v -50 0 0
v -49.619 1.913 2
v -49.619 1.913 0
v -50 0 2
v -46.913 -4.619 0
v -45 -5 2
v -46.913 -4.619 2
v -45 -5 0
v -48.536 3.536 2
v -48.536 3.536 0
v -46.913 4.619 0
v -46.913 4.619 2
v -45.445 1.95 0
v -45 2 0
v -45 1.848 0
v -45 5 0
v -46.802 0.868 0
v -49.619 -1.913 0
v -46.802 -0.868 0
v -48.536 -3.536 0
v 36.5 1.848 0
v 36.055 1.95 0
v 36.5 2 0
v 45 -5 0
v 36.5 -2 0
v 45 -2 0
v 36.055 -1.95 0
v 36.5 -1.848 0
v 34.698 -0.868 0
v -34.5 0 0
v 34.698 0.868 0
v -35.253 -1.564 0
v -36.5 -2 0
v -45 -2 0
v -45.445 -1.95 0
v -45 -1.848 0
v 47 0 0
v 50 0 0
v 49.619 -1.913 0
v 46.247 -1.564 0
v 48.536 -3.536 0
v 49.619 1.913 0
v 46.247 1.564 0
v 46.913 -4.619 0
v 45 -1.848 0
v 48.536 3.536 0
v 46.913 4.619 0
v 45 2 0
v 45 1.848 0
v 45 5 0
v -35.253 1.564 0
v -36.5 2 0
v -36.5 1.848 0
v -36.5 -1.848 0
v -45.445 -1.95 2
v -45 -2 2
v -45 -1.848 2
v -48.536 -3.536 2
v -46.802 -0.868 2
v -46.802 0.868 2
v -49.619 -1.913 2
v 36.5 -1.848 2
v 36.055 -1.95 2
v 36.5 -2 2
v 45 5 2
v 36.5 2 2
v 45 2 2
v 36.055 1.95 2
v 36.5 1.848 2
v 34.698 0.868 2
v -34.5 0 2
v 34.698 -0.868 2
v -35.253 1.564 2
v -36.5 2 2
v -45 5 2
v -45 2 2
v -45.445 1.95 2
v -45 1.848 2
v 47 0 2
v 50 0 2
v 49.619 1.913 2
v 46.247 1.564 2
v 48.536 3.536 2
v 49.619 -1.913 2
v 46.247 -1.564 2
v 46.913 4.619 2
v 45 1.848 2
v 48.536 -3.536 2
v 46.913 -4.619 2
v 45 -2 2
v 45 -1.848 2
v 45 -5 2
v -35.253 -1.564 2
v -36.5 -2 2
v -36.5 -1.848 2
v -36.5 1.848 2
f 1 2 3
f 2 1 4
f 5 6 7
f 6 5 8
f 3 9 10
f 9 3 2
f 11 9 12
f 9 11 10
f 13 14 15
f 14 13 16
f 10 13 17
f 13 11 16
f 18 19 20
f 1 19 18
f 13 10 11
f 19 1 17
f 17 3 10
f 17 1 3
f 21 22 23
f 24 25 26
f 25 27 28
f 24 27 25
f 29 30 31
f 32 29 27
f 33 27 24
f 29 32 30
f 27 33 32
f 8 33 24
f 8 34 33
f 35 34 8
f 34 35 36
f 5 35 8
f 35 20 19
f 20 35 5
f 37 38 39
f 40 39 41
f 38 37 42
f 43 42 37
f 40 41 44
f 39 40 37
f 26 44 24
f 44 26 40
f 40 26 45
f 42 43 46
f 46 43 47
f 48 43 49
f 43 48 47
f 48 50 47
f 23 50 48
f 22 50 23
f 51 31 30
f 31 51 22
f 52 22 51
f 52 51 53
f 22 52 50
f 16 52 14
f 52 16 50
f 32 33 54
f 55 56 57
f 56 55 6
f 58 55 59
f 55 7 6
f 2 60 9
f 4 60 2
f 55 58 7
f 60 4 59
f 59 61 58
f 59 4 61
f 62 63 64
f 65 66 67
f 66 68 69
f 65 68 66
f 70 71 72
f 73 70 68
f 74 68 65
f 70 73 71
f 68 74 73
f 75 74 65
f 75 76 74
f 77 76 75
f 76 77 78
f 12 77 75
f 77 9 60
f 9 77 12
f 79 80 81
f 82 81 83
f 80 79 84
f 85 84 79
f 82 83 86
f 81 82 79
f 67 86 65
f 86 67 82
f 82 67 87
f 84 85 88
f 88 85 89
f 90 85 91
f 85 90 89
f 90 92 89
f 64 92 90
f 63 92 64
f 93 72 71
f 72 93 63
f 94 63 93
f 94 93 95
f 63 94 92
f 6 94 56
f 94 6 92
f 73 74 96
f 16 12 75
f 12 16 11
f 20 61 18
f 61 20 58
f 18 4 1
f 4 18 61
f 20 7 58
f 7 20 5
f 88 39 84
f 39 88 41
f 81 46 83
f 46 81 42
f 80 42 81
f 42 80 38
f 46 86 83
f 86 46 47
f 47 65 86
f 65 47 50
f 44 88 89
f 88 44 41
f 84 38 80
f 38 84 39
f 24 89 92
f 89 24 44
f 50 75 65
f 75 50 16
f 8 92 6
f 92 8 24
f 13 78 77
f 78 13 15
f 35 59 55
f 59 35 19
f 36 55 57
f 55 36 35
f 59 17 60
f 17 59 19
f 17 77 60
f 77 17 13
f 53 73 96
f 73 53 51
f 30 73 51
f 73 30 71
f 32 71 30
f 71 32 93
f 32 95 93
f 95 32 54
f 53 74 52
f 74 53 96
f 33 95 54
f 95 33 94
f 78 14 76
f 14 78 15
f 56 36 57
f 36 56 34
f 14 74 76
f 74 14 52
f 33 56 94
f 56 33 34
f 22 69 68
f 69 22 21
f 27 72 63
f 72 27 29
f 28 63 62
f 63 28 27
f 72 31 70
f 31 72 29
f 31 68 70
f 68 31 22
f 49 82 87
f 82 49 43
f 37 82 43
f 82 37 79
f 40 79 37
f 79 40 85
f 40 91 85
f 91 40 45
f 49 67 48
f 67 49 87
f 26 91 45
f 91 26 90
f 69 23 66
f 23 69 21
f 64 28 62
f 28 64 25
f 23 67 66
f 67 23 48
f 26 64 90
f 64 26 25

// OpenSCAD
vHandleStrap_h = 2.0;
vHandleStrap_w = 10.0;
vHandleStrap_l = 100.0;

vHandleMovement_l = 25.0;

vHandleCutout_w = 4.0;

vCutoutOffset = vHandleStrap_l/2-vHandleMovement_l/4-(vHandleStrap_w-vHandleCutout_w)/2;

module handle_strap() {

module rounded_rect(l, w, h) {
    union()
    {
        translate([-l/2+w/2, 0, 0]) cylinder(h=h, d=w);
        translate([l/2-w/2, 0, 0]) cylinder(h=h, d=w);
        translate([-(l-w)/2, -w/2, 0]) cube([l-w, w, h]);
    }
}

difference() {
    rounded_rect(vHandleStrap_l, vHandleStrap_w, vHandleStrap_h);
    translate([-vCutoutOffset, 0, 0]) rounded_rect(vHandleMovement_l/2, vHandleCutout_w, vHandleStrap_h);
    translate([vCutoutOffset, 0, 0]) rounded_rect(vHandleMovement_l/2, vHandleCutout_w, vHandleStrap_h);
}

}
handle_strap();
